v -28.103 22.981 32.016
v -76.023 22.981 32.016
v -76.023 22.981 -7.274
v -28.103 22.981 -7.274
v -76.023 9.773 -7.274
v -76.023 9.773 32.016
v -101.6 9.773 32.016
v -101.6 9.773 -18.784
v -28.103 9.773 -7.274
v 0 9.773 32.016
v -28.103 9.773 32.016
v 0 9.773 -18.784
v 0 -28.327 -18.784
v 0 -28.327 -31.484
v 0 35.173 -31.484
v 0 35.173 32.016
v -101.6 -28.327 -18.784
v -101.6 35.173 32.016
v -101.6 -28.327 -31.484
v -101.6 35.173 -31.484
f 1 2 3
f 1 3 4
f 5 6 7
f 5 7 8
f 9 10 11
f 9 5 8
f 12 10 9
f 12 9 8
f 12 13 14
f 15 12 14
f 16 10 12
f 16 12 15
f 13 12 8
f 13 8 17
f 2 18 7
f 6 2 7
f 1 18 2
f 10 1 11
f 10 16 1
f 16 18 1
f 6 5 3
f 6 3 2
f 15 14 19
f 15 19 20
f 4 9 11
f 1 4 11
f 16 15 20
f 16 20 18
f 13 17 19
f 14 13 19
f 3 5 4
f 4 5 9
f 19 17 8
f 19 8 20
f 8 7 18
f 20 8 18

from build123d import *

# Parameters (mm, degrees)
F1_DEPTH = 101.6
F2_W     = 47.920428
F2_H     = 39.289536
F3_DEPTH = 13.208


with BuildPart() as f1:
    # F0 (on Right) → F1 (new body)
    with BuildSketch(Plane.YZ):
        Polygon((9.772886, -18.784101), (-28.327114, -18.784101), (-28.327114, -31.484101), (35.172886, -31.484101), (35.172886, 32.015899), (9.772886, 32.015899), align=None)
    extrude(amount=-F1_DEPTH)

    # F2 (on face) → F3 (cut)
    with BuildSketch(Plane.XZ.offset(-9.772886)):
        with Locations((-52.063208, 12.371131)):
            Rectangle(F2_W, F2_H)
    extrude(amount=-F3_DEPTH, mode=Mode.SUBTRACT)


solid = f1.part
